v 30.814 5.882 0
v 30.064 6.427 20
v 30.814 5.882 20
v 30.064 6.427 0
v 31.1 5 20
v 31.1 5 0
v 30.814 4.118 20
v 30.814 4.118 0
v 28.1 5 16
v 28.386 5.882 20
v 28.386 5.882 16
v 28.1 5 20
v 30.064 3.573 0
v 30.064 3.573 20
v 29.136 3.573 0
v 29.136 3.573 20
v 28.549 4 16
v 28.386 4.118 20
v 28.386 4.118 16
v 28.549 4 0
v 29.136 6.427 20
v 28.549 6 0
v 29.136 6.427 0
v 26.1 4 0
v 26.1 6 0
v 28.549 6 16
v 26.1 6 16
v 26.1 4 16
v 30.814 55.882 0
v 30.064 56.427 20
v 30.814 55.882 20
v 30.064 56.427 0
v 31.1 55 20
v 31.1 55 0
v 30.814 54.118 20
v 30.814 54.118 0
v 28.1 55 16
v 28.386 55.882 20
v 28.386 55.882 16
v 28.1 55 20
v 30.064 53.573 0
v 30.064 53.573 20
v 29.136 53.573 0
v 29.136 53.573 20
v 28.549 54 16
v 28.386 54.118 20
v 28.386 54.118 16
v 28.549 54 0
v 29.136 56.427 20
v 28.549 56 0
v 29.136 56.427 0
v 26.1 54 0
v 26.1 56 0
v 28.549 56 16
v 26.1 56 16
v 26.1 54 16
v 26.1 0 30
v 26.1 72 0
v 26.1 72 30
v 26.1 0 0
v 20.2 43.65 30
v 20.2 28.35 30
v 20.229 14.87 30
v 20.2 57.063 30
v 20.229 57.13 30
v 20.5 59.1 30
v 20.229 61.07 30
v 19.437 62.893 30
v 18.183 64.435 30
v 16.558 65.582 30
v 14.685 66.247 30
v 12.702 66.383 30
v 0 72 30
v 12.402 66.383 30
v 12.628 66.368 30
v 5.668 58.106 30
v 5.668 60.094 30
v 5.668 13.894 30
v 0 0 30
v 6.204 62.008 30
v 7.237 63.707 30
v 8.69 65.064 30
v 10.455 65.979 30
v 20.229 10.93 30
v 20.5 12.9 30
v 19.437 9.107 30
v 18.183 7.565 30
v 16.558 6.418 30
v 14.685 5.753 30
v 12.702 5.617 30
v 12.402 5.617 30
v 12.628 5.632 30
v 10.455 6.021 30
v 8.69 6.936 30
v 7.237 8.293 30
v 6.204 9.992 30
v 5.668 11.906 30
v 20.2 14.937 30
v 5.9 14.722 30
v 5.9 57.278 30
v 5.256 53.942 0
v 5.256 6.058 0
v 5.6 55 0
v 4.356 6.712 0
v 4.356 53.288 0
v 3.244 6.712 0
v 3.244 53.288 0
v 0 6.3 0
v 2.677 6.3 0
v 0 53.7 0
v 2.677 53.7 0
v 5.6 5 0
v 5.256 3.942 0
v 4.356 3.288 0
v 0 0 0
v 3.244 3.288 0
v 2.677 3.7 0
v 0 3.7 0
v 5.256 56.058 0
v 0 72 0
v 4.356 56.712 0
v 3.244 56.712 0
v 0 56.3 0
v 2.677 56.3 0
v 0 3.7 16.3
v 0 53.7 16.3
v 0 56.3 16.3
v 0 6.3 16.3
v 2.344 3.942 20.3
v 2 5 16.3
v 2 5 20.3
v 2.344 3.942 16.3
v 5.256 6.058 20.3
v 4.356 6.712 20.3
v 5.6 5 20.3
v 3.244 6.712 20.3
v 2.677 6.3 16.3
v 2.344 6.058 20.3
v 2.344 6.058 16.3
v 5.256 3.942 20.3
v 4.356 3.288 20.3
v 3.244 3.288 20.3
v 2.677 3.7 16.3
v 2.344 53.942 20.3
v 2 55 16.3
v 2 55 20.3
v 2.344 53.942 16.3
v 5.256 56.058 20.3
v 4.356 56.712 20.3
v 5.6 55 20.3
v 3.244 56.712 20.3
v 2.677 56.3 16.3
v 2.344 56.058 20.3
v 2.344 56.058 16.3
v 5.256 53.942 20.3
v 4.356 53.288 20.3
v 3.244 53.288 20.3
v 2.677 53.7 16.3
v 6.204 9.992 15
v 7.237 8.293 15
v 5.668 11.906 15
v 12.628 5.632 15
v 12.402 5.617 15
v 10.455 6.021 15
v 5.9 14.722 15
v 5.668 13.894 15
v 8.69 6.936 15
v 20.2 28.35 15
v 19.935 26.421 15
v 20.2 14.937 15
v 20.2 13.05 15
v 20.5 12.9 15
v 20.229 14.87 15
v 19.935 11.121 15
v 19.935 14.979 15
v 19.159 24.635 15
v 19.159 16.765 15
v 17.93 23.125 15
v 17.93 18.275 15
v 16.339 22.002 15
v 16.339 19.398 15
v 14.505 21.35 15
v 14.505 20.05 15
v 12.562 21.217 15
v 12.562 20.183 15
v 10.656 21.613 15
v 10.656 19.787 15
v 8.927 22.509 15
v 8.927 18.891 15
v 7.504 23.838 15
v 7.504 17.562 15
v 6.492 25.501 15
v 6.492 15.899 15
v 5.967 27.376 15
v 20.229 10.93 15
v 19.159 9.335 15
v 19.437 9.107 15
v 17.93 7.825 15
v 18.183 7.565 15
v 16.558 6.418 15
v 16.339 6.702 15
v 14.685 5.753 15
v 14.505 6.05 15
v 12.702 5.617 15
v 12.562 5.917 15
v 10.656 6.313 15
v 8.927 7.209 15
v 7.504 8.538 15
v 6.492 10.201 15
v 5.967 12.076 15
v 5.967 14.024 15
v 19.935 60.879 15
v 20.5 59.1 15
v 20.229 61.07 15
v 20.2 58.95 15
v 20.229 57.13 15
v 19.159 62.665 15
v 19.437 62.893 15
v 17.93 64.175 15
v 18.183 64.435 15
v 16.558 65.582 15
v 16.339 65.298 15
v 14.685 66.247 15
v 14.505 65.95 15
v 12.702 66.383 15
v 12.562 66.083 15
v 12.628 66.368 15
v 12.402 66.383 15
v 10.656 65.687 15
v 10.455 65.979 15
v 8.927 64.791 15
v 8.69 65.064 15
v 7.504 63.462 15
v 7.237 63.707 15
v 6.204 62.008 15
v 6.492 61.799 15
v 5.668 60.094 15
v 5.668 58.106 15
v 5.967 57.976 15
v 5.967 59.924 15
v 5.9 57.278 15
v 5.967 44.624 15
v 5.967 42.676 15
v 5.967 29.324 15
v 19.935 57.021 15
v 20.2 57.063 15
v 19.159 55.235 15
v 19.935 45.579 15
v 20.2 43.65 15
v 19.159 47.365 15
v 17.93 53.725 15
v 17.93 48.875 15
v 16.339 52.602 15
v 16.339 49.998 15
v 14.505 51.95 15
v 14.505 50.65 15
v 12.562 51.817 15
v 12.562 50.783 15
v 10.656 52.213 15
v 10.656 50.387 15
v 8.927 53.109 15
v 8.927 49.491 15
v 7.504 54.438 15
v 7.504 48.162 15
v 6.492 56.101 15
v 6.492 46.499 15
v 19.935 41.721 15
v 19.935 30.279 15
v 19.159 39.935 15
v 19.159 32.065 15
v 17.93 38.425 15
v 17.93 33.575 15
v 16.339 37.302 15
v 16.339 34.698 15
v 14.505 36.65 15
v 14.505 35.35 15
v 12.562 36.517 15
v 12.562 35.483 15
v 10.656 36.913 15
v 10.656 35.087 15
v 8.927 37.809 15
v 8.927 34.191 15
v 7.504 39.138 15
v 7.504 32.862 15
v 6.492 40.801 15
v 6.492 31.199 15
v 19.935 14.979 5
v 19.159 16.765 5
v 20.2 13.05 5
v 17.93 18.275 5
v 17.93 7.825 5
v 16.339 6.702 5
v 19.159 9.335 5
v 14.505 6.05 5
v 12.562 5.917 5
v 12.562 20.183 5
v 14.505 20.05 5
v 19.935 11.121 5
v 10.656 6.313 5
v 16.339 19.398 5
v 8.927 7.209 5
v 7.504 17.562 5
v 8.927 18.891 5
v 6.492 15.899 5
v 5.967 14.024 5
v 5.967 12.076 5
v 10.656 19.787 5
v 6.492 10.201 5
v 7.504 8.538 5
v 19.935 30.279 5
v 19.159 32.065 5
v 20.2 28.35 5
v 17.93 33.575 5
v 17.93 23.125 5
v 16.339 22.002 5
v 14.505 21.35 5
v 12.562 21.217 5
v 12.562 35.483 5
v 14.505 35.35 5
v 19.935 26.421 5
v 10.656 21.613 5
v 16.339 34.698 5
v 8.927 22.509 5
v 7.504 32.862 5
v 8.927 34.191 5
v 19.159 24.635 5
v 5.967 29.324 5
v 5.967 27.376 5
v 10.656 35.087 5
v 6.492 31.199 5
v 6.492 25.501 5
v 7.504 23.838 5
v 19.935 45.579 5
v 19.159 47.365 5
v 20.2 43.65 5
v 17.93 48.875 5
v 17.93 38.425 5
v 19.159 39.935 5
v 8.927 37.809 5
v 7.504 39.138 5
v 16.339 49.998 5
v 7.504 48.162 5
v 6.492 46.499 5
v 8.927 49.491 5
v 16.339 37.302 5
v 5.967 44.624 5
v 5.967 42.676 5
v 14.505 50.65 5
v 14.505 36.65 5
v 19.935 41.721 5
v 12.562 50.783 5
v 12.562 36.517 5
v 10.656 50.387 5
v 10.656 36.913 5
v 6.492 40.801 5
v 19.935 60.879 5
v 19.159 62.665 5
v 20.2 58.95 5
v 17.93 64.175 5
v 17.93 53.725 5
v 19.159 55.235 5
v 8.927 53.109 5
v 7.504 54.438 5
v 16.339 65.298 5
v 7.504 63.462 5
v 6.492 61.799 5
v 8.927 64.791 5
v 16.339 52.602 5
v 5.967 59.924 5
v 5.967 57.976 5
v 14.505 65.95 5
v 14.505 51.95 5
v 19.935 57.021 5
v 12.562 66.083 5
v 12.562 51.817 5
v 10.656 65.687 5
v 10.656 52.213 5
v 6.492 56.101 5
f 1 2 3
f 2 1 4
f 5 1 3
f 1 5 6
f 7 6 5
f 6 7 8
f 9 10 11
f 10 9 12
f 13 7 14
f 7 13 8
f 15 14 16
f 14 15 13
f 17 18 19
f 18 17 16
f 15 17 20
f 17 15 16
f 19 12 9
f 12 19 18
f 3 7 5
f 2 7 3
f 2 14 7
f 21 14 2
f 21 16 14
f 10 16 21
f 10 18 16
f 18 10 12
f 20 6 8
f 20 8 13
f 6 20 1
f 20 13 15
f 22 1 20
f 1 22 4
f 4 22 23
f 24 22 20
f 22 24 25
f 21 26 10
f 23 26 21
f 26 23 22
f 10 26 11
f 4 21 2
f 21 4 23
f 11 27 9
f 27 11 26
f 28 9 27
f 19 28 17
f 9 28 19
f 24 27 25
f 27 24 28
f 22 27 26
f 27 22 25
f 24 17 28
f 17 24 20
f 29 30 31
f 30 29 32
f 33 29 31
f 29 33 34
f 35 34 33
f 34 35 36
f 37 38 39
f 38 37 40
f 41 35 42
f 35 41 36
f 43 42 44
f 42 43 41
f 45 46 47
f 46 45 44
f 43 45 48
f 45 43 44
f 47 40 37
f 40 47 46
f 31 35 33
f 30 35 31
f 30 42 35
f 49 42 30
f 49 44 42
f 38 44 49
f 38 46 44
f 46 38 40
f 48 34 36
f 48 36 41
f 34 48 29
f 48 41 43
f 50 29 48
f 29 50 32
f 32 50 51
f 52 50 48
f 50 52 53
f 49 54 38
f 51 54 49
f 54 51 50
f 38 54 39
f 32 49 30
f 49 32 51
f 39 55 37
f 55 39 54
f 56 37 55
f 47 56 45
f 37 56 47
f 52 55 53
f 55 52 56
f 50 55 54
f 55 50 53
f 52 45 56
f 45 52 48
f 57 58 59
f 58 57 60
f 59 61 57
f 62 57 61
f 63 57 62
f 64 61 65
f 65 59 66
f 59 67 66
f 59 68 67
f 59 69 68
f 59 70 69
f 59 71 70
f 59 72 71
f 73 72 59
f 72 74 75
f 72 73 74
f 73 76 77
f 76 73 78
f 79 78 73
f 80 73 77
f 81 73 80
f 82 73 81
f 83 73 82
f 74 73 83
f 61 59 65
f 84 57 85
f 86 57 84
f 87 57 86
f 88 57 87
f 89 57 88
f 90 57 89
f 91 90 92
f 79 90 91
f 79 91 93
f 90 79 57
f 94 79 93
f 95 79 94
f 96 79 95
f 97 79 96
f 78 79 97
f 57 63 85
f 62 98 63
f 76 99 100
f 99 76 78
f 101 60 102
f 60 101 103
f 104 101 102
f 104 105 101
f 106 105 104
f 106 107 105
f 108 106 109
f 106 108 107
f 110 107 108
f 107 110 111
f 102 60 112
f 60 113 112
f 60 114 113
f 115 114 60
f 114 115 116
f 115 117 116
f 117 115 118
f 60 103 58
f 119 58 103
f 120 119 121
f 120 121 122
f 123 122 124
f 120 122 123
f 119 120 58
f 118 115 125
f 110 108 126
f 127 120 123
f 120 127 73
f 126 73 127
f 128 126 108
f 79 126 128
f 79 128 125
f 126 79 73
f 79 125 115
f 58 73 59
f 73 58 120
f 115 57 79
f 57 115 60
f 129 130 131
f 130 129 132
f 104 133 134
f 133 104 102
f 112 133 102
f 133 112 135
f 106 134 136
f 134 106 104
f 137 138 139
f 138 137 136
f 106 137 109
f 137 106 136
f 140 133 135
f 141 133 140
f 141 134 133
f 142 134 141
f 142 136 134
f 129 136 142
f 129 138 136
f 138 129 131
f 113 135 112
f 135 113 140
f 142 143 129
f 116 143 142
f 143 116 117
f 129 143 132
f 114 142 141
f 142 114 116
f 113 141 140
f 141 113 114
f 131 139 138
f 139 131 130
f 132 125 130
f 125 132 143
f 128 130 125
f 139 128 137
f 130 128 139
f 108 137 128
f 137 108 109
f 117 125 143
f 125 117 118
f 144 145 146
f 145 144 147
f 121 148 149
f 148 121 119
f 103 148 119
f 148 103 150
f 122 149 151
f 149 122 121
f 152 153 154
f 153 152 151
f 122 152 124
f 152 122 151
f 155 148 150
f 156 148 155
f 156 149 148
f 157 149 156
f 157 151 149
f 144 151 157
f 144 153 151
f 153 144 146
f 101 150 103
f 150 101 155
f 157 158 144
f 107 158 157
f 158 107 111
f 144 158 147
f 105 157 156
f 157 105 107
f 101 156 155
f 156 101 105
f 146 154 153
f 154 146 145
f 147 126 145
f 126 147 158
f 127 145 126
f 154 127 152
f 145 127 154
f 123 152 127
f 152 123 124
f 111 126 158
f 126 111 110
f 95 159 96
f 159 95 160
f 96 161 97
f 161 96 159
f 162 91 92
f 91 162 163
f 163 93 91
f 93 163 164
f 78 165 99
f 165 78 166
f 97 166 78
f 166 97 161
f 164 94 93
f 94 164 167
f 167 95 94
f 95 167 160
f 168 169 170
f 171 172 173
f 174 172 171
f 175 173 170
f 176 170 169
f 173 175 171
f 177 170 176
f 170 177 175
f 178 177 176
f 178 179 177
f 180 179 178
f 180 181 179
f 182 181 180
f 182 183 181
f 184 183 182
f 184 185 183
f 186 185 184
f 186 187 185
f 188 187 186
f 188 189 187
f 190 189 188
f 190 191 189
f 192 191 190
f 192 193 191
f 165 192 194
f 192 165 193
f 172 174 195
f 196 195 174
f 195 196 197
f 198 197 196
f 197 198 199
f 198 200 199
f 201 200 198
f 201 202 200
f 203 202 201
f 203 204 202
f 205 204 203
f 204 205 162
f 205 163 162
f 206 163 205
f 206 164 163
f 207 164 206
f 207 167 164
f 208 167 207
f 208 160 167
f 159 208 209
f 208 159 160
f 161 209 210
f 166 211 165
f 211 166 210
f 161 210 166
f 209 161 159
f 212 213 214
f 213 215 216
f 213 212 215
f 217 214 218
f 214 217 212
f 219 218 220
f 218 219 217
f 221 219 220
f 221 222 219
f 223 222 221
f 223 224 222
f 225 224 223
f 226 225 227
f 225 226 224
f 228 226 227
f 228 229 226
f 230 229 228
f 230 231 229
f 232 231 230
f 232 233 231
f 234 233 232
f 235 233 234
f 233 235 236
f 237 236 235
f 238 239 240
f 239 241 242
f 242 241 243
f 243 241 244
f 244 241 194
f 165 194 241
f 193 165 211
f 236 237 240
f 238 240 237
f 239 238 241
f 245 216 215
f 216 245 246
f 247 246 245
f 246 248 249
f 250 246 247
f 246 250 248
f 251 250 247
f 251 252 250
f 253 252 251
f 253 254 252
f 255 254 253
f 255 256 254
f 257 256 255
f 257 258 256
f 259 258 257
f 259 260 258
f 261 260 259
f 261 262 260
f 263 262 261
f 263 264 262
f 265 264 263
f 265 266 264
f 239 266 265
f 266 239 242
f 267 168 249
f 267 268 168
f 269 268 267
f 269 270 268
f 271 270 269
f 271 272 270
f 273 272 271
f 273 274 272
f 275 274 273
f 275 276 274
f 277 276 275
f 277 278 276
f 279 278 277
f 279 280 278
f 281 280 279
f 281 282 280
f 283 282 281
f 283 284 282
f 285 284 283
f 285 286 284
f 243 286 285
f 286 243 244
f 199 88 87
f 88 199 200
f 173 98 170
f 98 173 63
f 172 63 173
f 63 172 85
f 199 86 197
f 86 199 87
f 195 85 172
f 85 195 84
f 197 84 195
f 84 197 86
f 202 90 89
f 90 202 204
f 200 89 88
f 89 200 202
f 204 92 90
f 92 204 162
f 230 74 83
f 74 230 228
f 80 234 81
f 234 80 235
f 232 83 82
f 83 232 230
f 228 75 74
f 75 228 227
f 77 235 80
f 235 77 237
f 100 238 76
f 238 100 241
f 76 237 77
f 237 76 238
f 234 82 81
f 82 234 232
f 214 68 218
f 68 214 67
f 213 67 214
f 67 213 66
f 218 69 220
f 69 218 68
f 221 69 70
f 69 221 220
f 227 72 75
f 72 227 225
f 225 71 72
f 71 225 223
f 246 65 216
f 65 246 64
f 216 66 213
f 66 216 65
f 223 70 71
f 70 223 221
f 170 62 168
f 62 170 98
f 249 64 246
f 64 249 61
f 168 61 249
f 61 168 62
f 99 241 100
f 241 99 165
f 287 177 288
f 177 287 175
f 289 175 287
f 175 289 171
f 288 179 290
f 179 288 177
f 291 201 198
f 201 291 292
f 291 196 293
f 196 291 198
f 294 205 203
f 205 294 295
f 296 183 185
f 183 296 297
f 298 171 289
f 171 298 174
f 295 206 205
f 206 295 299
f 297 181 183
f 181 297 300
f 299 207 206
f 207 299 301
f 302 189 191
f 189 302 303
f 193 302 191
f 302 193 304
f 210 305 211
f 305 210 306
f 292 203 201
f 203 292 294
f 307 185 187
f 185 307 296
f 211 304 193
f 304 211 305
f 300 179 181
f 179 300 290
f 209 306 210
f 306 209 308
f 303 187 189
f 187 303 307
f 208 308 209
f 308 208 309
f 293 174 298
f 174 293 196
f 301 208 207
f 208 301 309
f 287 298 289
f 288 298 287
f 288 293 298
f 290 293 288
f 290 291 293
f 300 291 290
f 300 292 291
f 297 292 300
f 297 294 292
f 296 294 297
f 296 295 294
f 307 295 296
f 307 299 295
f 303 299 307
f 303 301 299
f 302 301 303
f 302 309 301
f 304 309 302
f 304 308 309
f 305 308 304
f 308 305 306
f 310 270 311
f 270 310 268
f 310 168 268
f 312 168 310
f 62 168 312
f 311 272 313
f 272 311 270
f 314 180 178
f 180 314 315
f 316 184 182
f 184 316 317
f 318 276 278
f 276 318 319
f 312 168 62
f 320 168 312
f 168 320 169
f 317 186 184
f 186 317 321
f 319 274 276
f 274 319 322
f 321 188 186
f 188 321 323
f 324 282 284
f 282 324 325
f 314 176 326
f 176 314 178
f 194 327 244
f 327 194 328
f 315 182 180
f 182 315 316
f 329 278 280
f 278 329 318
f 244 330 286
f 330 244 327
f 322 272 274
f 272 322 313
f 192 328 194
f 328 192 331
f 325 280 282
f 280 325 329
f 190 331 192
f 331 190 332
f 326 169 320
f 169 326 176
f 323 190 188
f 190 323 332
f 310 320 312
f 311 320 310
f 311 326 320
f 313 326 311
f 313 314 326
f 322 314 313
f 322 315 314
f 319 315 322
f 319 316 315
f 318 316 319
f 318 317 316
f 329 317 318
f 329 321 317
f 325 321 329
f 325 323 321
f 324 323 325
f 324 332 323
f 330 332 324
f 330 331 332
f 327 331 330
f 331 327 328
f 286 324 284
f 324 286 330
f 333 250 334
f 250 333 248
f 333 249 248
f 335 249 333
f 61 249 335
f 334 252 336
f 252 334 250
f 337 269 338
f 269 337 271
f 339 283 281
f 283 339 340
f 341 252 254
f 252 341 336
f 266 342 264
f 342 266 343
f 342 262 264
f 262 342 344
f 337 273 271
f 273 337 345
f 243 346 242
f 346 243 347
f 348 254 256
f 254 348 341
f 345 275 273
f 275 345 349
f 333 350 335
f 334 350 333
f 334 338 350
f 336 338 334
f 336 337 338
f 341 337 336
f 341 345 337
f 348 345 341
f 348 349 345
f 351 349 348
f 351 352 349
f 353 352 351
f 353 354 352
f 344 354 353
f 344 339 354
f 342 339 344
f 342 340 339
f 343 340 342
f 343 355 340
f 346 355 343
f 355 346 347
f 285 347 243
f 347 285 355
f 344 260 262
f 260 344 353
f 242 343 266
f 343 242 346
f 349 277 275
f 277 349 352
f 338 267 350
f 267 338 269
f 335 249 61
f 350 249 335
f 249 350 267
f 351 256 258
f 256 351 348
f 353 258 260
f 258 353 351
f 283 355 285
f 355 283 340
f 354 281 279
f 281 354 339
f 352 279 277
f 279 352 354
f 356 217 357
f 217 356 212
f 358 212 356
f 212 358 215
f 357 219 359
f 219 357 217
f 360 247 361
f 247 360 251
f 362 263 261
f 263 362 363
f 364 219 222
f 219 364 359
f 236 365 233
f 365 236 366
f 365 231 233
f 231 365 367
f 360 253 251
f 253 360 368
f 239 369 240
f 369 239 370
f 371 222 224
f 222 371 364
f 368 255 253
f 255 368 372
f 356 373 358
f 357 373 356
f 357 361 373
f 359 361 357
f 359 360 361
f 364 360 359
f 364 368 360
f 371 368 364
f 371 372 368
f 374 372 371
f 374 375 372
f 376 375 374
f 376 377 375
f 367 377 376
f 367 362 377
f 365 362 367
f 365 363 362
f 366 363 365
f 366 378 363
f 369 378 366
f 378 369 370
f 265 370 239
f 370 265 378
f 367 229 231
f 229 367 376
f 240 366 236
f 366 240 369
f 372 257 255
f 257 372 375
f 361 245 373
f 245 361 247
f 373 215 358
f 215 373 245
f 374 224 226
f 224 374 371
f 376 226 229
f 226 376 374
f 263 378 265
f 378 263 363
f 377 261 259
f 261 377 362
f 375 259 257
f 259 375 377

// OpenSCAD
/* [Battery Box] */

// The type of battery to hold in the box
type="cylinder"; // [bundle:Round Battery Bundle,cylinder:Round Battery,block:Square Battery]

/* [Bundles] */

// Number of batteries wide in each bundle
bundle_width_count=4; // [2:100]

// Number of batteries long in each bundle
bundle_length_count=1; // [1:100]

// Spacing between batteries in bundles in mm (usually 0)
battery_bundle_spacing=0; // [0:10]

/* [Round Battery] */

// Use a standard battery diameters
battery_type="AA"; // [AAAA,AAA,AA,C,D,Other]

// Battery diameter in mm
battery_other_diameter=14; // [1:100]

/* [Hidden] */

// AAAA = 8.3 mm
// AAA = 10.5 mm
// AA = 14 mm
// C = 26.2 mm
// D = 34 mm
battery_diameter =
      battery_type == "AAAA" ? 8.3
    : battery_type == "AAA"  ? 10.5
    : battery_type == "AA"   ? 14
    : battery_type == "C"    ? 26.2
    : battery_type == "D"    ? 34
    :                          battery_other_diameter;

/* [Square Battery] */

// 9V = 26 mm x 17 mm
battery_width=26; // [1:100]
battery_length=17; // [1:100]

/* [Print Details] */

// How much room to give batteries in the box in mm
battery_clearance=0.3; // [0:0.05:1]

/* [Hidden] */

battery_diameter_w_clearance=battery_diameter+battery_clearance;

battery_width_w_clearance=battery_width+battery_clearance;
battery_length_w_clearance=battery_length+battery_clearance;

bundle_width=bundle_width_count*battery_diameter+battery_bundle_spacing*(bundle_width_count-1)+battery_clearance*2;
bundle_length=bundle_length_count*battery_diameter+battery_bundle_spacing*(bundle_length_count-1)+battery_clearance*2;

/* [Battery Box] */

// Number of batteries or bundles wide
battbox_count_wide=1; // [1:100]

// Number of batteries or bundles long
battbox_count_long=4; // [1:100]

// Space between batteries in mm
battbox_spacing=1; // [0:10]

// Height of the battery box in mm
battbox_height=30; // [10:100]

/* [Hidden] */

joint_height=battbox_height * 2/3;
joint_diameter=3;
joint_setback=2;
joint_setback_width=2;
joint_setback_height=joint_height * 4/5;
joint_offset=5;
joint_spacing=50;
joint_v_clearance=0.3;
joint_d_clearance=0.3;

joint_max=1000;

battbox_edge_width_extra=0.3;
battbox_edge_width=joint_setback+joint_diameter+joint_d_clearance*2+battbox_edge_width_extra;
battbox_base_thickness=5;

function battbox_dimension(sizing, count) =
    sizing*count+battbox_spacing*(count-1)+battbox_edge_width*2;

battbox_width_w_bundle=battbox_dimension(bundle_width, battbox_count_wide);
battbox_length_w_bundle=battbox_dimension(bundle_length,battbox_count_long);

battbox_width_w_cylinder=battbox_dimension(battery_diameter+battery_clearance,battbox_count_wide);
battbox_length_w_cylinder=battbox_dimension(battery_diameter+battery_clearance,battbox_count_long);

battbox_width_w_block=battbox_dimension(battery_width+battery_clearance,battbox_count_wide);
battbox_length_w_block=battbox_dimension(battery_length+battery_clearance,battbox_count_long);

function battbox_width() =
    type == "bundle"   ? battbox_width_w_bundle   :
    type == "cylinder" ? battbox_width_w_cylinder :
 /* type == "block" */   battbox_width_w_block;
function battbox_length() =
    type == "bundle"   ? battbox_length_w_bundle   :
    type == "cylinder" ? battbox_length_w_cylinder :
 /* type == "block" */   battbox_length_w_block;

battery_cut_height=battbox_height*2;
battbox_inset_height=battbox_height*1/3;

battbox_inset_width=battbox_width() - battbox_edge_width*2;
battbox_inset_length=battbox_length() - battbox_edge_width*2;

function joint_count() =
    min(joint_max,floor((battbox_length() - joint_offset*2) / joint_spacing)+1);

module joint(cv,cd) {
    union() {
        translate([joint_diameter/2+cd+joint_setback,0,0])
        cylinder(joint_height+cv,d=joint_diameter+cd*2,$fn=10);

        translate([0,-(joint_setback_width/2+cd),0])
        cube([joint_setback+joint_diameter/2+cd,joint_setback_width+cd*2,joint_setback_height+cv]);
    }
}

module joints(cv,cd) {
    union() {
        for (j = [0:joint_count()-1]) {
            translate([0,joint_spacing*j,0])
            joint(cv,cd);
        }
    }
}

module joint_tabs() {
    translate([battbox_width(),joint_offset,0])
    joints(0,0);
}

module joint_sockets() {
    translate([0,joint_offset,0])
    joints(joint_v_clearance, joint_d_clearance);
}

module battbox_inset_cutout() {
    if (type == "bundle" || type == "cylinder") {
        translate([0,0,battbox_base_thickness+battbox_inset_height])
        union() {
            translate([battery_diameter/2,battery_diameter/2,0])
            cylinder(battery_cut_height,d=battery_diameter+battery_clearance*2);
            
            translate([battbox_inset_width-battery_diameter/2,battery_diameter/2,0])
            cylinder(battery_cut_height,d=battery_diameter+battery_clearance*2);
            
            translate([battery_diameter/2,battbox_inset_length-battery_diameter/2,0])
            cylinder(battery_cut_height,d=battery_diameter+battery_clearance*2);
            
            translate([battbox_inset_width-battery_diameter/2,battbox_inset_length-battery_diameter/2,0])
            cylinder(battery_cut_height,d=battery_diameter+battery_clearance*2);
            
            translate([0,battery_diameter/2,0])
            cube([battbox_inset_width,battbox_inset_length-battery_diameter,battery_cut_height]);
            
            translate([battery_diameter/2,0,0])
            cube([battbox_inset_width-battery_diameter,battbox_inset_length,battery_cut_height]);
        }
    }
    else if (type == "block") {
        translate([0,0,battbox_base_thickness+battbox_inset_height])
        cube([battbox_inset_width,battbox_inset_length,battery_cut_height]);
    }
}

module bundle_slot() {
    translate([0,0,battbox_base_thickness])
    union() {
        translate([battery_diameter/2,battery_diameter/2,0])
        cylinder(battery_cut_height,d=battery_diameter+battery_clearance*2);
        
        translate([bundle_width-battery_diameter/2,battery_diameter/2,0])
        cylinder(battery_cut_height,d=battery_diameter+battery_clearance*2);
        
        translate([battery_diameter/2,bundle_length-battery_diameter/2,0])
        cylinder(battery_cut_height,d=battery_diameter+battery_clearance*2);
        
        translate([bundle_width-battery_diameter/2,bundle_length-battery_diameter/2,0])
        cylinder(battery_cut_height,d=battery_diameter+battery_clearance*2);
        
        translate([0,battery_diameter/2,0])
        cube([bundle_width,bundle_length-battery_diameter,battery_cut_height]);
        
        translate([battery_diameter/2,0,0])
        cube([bundle_width-battery_diameter,bundle_length,battery_cut_height]);
    }
}

module cylinder_slot() {
    translate([battery_diameter_w_clearance/2,battery_diameter_w_clearance/2,battbox_base_thickness])
    cylinder(battery_cut_height,d=battery_diameter_w_clearance);
}

module box_slot() {
    translate([0,0,battbox_base_thickness])
    cube([battery_width_w_clearance,battery_length_w_clearance,battery_cut_height]);
}

module slot(w,l) {
    if (type == "bundle") {
        translate([battbox_edge_width+(bundle_width+battbox_spacing)*(w-1),battbox_edge_width+(bundle_length+battbox_spacing)*(l-1),0])
        bundle_slot();
    }
    
    else if (type == "cylinder") {
        translate([battbox_edge_width+(battery_diameter_w_clearance+battbox_spacing)*(w-1),battbox_edge_width+(battery_diameter_w_clearance+battbox_spacing)*(l-1),0])
        cylinder_slot();
    }
    else if (type == "block") {
        translate([battbox_edge_width+(battery_width_w_clearance+battbox_spacing)*(w-1),battbox_edge_width+(battery_length_w_clearance+battbox_spacing)*(l-1),0])
        box_slot();
    }
}

module battery_box() {
    difference() {
        union() {
            cube([battbox_width(),battbox_length(),battbox_height]);       
    
            joint_tabs();
        }

        joint_sockets();

        translate([battbox_edge_width,battbox_edge_width,0])
        battbox_inset_cutout();
    
        for (w = [1:battbox_count_wide]) {
            for(l = [1:battbox_count_long]) {
                slot(w,l);
            }
        }
    }
}

battery_box();
